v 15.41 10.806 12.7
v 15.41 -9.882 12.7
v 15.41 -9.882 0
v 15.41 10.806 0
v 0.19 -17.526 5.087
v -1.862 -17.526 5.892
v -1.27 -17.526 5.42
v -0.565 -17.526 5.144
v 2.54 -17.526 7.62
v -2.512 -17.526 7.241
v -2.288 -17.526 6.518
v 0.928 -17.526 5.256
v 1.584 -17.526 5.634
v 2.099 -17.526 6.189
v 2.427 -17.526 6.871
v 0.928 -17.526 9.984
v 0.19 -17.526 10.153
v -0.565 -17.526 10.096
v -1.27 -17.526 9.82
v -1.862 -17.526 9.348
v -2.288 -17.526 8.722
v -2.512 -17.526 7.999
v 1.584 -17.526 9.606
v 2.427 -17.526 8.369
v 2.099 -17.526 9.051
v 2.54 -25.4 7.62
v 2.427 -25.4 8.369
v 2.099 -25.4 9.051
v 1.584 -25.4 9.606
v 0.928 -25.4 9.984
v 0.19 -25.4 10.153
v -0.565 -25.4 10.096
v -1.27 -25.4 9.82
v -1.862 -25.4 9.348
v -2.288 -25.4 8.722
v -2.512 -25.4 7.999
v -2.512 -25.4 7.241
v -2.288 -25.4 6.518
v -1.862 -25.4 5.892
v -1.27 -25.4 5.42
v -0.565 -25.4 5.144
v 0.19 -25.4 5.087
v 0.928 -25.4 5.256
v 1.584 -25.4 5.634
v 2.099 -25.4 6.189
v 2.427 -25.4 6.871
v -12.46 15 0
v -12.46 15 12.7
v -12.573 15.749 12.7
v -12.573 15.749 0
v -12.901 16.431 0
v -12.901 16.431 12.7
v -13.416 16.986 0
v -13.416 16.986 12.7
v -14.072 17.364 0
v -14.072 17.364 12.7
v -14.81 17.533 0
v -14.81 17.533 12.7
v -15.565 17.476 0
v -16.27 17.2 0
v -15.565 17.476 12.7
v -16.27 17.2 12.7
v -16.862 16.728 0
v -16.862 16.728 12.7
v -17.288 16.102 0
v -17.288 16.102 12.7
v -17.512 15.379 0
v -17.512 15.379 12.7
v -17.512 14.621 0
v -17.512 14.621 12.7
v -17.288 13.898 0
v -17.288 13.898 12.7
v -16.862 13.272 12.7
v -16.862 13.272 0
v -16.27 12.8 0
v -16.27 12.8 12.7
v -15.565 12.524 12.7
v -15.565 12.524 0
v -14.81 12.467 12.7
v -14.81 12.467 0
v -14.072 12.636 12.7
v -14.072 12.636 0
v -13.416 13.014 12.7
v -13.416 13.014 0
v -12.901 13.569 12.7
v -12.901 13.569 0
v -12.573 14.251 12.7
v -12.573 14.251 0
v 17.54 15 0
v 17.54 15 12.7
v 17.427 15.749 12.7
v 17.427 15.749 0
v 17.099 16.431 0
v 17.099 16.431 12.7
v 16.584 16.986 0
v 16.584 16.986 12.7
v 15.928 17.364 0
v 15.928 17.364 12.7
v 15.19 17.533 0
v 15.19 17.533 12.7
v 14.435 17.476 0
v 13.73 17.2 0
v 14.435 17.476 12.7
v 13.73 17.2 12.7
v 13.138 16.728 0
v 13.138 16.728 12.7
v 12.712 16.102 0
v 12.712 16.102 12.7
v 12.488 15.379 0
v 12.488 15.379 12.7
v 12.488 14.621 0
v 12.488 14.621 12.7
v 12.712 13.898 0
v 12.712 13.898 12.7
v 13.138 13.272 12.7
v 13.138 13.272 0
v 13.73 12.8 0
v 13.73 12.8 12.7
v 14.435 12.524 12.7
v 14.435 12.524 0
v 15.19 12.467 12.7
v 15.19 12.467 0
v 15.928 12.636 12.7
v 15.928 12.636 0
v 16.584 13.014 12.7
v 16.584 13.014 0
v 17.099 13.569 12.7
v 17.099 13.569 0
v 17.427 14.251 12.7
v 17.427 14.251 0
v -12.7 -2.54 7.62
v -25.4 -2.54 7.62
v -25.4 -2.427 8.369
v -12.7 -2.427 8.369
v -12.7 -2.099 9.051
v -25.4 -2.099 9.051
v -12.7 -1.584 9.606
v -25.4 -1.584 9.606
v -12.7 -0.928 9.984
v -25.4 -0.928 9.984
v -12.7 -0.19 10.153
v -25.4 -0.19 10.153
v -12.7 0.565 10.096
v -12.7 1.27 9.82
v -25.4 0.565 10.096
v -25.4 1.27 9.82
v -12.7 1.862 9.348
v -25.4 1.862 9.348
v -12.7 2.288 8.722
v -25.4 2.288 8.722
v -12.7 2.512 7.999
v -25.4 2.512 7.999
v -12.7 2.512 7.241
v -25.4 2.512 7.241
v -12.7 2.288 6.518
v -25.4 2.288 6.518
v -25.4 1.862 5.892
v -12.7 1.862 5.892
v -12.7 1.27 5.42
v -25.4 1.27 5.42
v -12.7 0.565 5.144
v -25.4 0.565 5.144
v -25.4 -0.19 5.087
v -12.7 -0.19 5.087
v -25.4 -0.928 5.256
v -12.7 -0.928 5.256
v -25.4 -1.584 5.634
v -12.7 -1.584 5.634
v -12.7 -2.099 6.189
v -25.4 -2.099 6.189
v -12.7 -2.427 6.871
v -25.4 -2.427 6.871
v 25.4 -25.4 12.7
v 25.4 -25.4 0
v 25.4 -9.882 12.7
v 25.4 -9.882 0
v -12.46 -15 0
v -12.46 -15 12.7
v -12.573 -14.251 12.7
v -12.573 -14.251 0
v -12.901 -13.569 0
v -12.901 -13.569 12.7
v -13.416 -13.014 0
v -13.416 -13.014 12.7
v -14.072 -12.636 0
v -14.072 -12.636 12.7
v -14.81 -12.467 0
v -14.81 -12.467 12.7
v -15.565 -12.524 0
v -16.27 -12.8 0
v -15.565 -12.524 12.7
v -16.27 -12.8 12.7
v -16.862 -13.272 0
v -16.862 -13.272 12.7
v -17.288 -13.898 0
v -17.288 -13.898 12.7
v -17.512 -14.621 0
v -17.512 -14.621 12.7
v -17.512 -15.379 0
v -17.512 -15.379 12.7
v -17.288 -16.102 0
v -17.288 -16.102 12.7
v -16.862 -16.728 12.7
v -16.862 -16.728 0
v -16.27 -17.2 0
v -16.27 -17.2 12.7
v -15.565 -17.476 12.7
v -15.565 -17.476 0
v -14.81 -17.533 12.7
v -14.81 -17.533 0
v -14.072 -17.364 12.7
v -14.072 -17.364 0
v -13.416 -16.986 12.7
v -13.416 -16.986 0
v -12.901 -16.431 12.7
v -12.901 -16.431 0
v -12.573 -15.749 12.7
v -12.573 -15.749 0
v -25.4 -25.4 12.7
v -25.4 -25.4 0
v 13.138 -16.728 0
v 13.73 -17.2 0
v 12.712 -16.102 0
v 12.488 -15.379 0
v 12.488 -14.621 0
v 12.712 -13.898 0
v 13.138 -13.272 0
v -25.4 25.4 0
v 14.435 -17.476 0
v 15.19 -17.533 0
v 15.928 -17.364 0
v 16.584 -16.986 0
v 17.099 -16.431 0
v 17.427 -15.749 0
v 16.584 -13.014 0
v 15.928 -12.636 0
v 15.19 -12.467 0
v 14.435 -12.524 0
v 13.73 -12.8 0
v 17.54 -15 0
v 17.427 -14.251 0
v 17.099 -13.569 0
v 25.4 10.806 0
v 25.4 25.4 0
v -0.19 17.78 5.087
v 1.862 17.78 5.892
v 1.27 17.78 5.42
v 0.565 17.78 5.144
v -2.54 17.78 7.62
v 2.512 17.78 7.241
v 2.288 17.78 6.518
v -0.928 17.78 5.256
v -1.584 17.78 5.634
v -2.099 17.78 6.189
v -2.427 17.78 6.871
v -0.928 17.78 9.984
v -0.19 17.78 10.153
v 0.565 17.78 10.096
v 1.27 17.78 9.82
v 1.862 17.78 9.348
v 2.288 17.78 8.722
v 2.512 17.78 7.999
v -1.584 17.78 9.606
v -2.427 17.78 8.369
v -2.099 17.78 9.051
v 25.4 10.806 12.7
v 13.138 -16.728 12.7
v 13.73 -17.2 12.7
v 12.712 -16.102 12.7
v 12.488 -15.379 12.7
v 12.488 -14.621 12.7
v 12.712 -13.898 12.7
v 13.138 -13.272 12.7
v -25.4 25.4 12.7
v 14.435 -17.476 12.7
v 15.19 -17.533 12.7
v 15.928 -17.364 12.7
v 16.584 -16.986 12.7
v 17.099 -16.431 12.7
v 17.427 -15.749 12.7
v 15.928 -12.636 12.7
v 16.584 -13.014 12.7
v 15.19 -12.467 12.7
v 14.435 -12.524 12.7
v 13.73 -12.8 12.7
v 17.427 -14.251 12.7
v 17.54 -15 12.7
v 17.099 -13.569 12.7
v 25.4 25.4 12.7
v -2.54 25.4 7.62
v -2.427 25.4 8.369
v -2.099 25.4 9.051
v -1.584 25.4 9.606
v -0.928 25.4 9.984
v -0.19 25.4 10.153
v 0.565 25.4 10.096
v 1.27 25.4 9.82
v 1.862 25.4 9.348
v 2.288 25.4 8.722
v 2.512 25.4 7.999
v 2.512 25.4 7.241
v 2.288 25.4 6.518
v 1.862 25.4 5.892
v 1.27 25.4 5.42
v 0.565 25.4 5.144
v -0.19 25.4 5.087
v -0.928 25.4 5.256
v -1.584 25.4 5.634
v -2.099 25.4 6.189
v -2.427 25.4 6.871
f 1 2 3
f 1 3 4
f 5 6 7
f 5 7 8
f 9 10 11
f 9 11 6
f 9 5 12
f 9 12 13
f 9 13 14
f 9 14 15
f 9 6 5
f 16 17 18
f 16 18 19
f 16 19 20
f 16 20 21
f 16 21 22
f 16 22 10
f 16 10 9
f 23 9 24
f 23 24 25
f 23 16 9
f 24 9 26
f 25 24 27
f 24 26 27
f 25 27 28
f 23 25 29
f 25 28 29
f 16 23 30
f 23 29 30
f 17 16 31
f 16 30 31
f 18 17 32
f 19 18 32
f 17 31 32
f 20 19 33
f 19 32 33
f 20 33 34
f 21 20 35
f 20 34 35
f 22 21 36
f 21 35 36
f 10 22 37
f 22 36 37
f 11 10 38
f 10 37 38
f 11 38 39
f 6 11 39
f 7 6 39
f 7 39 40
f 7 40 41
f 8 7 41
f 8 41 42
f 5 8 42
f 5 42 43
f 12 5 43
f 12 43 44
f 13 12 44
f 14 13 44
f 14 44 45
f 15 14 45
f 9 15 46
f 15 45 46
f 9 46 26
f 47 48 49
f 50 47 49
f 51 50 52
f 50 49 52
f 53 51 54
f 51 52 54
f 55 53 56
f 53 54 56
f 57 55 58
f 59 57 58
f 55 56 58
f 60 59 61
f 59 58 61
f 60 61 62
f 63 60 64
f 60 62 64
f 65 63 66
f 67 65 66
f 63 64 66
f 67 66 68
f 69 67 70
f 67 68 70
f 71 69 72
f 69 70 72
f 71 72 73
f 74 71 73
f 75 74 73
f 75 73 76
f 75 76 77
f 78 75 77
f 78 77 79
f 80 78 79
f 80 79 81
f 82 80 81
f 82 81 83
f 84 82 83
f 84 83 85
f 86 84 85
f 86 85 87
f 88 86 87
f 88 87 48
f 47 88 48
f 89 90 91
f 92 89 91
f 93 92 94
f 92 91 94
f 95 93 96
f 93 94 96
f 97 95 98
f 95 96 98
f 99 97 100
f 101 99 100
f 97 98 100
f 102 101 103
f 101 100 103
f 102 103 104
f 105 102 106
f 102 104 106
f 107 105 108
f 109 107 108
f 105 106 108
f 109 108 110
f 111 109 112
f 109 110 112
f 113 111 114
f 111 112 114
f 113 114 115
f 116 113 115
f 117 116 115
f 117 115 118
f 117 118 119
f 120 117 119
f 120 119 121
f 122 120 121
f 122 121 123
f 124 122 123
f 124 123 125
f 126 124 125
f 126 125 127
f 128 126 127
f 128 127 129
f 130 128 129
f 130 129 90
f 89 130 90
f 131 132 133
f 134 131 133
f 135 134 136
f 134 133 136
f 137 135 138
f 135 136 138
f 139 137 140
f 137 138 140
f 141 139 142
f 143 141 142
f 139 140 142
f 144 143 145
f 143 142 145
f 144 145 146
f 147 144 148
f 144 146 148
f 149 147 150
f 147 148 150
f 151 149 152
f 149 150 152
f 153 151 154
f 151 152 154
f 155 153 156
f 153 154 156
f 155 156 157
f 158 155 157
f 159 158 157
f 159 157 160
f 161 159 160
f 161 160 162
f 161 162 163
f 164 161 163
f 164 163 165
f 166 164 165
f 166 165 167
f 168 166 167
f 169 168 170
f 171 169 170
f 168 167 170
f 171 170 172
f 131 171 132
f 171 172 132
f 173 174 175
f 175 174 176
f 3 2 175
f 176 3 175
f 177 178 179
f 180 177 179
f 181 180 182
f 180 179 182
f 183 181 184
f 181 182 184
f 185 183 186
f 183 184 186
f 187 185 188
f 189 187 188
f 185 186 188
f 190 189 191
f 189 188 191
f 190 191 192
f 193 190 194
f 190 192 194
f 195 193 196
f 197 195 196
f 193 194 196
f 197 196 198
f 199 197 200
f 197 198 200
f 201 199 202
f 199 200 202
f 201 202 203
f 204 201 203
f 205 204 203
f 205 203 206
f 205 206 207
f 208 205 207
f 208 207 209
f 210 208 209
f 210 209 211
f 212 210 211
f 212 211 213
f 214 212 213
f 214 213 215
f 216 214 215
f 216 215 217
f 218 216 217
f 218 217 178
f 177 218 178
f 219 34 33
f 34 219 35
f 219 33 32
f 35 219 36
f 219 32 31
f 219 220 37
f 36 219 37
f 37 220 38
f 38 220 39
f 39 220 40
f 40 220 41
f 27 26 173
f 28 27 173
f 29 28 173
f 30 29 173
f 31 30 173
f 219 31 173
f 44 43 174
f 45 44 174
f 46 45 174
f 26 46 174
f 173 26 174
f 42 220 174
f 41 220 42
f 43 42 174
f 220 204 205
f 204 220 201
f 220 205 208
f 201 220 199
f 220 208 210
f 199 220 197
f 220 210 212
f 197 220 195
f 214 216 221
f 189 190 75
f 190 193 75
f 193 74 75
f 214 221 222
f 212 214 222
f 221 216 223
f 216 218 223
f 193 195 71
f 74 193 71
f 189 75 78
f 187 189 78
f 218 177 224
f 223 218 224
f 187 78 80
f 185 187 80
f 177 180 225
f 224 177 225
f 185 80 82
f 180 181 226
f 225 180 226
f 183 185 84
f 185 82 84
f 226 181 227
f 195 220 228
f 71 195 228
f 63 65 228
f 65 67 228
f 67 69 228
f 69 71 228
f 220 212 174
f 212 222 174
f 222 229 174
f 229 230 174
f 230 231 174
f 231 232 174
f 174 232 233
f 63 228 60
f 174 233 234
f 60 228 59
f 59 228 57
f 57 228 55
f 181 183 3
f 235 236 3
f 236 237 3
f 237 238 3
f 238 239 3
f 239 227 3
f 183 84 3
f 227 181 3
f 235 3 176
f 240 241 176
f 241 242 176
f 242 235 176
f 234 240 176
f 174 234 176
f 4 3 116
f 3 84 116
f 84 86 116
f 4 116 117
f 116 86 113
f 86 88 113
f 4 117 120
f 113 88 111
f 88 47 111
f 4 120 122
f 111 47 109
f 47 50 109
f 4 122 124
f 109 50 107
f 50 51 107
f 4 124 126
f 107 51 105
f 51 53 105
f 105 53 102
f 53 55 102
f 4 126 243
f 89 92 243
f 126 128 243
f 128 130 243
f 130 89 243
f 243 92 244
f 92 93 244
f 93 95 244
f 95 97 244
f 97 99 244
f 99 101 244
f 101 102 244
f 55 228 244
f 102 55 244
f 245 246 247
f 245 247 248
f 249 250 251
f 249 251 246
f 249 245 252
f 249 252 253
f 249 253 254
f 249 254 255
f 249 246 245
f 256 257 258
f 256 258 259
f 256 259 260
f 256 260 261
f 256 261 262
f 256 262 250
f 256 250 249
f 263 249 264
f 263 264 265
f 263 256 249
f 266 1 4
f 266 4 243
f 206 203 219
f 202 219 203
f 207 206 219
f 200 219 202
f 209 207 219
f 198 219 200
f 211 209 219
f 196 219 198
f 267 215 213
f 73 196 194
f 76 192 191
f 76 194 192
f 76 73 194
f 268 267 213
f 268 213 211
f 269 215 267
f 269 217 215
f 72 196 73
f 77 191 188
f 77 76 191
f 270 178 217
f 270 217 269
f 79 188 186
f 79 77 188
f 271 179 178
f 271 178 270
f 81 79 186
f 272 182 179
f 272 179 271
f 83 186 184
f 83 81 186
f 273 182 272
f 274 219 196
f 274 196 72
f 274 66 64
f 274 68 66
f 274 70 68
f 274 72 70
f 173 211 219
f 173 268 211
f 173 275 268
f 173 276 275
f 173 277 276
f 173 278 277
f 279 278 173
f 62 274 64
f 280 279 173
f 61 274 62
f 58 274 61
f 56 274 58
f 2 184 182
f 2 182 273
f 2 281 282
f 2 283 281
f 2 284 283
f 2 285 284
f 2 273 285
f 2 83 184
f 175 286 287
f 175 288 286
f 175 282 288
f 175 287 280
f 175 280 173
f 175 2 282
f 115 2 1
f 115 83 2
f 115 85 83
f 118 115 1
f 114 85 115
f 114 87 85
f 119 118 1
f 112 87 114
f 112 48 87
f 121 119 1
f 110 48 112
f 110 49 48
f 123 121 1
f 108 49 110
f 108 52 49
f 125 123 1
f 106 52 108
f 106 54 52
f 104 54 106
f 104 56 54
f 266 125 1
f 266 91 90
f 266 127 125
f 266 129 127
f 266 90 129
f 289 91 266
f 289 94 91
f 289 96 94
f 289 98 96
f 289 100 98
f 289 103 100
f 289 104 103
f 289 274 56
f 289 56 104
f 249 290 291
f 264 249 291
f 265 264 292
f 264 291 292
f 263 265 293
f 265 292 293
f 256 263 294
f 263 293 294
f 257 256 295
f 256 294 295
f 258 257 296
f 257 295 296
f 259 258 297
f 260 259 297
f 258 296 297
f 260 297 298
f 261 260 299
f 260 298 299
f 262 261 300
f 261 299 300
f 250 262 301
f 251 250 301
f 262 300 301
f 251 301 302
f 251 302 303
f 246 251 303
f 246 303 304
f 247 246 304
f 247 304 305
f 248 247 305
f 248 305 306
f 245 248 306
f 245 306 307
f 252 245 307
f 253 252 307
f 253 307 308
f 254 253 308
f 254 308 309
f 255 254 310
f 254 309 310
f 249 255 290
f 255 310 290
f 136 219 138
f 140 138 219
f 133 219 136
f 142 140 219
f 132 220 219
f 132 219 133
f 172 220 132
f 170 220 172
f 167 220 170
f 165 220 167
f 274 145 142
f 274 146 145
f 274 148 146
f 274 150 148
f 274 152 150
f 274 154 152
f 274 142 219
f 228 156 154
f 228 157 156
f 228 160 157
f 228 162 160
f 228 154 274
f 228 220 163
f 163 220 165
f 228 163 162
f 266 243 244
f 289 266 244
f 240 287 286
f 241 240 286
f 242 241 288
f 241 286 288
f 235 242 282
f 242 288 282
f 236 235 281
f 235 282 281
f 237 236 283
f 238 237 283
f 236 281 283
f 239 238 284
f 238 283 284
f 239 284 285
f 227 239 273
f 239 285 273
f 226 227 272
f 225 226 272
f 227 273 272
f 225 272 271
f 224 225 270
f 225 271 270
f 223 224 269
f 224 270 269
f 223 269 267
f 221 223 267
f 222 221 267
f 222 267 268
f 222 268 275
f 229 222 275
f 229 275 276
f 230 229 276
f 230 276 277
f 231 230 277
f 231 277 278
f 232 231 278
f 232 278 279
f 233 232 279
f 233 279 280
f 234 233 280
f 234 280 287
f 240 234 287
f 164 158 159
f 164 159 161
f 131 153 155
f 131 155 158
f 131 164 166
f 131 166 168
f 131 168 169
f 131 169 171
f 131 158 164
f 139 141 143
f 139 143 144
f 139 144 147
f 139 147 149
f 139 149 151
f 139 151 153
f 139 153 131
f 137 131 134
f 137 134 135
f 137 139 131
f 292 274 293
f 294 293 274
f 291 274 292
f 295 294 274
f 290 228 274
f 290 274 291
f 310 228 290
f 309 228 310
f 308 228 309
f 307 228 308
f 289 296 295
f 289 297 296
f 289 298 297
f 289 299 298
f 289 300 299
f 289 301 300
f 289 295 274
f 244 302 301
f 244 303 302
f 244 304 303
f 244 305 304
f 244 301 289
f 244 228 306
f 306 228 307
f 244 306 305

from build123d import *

# Parameters (mm, degrees)
F0_W      = 50.8
F0_H      = 50.8
F1_DEPTH  = 12.7
F2_W      = 9.9903053224
F2_H      = 20.6871938426
F3_DEPTH  = 25.4
F4_R      = 2.54
F5_DEPTH  = 25.4
F6_R      = 2.54
F7_DEPTH  = 7.874
F8_R      = 2.54
F9_DEPTH  = 12.7
F10_R     = 2.54
F11_DEPTH = 7.62


with BuildPart() as f1:
    # F0 (on Top) → F1 (new body)
    with BuildSketch(Plane.XY):
        Rectangle(F0_W, F0_H)
    extrude(amount=F1_DEPTH)

    # F2 (on face) → F3 (cut)
    with BuildSketch(Plane.XY.offset(12.7)):
        with Locations((20.4048473388, 0.4619845422)):
            Rectangle(F2_W, F2_H)
    extrude(amount=-F3_DEPTH, mode=Mode.SUBTRACT)

    # F4 (on face) → F5 (cut)
    with BuildSketch(Plane.XY.offset(12.7)):
        with Locations((-15, 15)):
            Circle(F4_R)
        with Locations((15, 15)):
            Circle(F4_R)
        with Locations((-15, -15)):
            Circle(F4_R)
        with Locations((15, -15)):
            Circle(F4_R)
    extrude(amount=-F5_DEPTH, mode=Mode.SUBTRACT)

    # F6 (on face) → F7 (cut)
    with BuildSketch(Plane.XZ.offset(25.4)):
        with Locations((0, 7.62)):
            Circle(F6_R)
    extrude(amount=-F7_DEPTH, mode=Mode.SUBTRACT)

    # F8 (on face) → F9 (cut)
    with BuildSketch(Plane(origin=(-25.4, 0, 0), x_dir=(0, -1, 0), z_dir=(-1, 0, 0))):
        with Locations((0, 7.62)):
            Circle(F8_R)
    extrude(amount=-F9_DEPTH, mode=Mode.SUBTRACT)

    # F10 (on face) → F11 (cut)
    with BuildSketch(Plane(origin=(0, 25.4, 0), x_dir=(-1, 0, 0), z_dir=(0, 1, 0))):
        with Locations((0, 7.62)):
            Circle(F10_R)
    extrude(amount=-F11_DEPTH, mode=Mode.SUBTRACT)


solid = f1.part
